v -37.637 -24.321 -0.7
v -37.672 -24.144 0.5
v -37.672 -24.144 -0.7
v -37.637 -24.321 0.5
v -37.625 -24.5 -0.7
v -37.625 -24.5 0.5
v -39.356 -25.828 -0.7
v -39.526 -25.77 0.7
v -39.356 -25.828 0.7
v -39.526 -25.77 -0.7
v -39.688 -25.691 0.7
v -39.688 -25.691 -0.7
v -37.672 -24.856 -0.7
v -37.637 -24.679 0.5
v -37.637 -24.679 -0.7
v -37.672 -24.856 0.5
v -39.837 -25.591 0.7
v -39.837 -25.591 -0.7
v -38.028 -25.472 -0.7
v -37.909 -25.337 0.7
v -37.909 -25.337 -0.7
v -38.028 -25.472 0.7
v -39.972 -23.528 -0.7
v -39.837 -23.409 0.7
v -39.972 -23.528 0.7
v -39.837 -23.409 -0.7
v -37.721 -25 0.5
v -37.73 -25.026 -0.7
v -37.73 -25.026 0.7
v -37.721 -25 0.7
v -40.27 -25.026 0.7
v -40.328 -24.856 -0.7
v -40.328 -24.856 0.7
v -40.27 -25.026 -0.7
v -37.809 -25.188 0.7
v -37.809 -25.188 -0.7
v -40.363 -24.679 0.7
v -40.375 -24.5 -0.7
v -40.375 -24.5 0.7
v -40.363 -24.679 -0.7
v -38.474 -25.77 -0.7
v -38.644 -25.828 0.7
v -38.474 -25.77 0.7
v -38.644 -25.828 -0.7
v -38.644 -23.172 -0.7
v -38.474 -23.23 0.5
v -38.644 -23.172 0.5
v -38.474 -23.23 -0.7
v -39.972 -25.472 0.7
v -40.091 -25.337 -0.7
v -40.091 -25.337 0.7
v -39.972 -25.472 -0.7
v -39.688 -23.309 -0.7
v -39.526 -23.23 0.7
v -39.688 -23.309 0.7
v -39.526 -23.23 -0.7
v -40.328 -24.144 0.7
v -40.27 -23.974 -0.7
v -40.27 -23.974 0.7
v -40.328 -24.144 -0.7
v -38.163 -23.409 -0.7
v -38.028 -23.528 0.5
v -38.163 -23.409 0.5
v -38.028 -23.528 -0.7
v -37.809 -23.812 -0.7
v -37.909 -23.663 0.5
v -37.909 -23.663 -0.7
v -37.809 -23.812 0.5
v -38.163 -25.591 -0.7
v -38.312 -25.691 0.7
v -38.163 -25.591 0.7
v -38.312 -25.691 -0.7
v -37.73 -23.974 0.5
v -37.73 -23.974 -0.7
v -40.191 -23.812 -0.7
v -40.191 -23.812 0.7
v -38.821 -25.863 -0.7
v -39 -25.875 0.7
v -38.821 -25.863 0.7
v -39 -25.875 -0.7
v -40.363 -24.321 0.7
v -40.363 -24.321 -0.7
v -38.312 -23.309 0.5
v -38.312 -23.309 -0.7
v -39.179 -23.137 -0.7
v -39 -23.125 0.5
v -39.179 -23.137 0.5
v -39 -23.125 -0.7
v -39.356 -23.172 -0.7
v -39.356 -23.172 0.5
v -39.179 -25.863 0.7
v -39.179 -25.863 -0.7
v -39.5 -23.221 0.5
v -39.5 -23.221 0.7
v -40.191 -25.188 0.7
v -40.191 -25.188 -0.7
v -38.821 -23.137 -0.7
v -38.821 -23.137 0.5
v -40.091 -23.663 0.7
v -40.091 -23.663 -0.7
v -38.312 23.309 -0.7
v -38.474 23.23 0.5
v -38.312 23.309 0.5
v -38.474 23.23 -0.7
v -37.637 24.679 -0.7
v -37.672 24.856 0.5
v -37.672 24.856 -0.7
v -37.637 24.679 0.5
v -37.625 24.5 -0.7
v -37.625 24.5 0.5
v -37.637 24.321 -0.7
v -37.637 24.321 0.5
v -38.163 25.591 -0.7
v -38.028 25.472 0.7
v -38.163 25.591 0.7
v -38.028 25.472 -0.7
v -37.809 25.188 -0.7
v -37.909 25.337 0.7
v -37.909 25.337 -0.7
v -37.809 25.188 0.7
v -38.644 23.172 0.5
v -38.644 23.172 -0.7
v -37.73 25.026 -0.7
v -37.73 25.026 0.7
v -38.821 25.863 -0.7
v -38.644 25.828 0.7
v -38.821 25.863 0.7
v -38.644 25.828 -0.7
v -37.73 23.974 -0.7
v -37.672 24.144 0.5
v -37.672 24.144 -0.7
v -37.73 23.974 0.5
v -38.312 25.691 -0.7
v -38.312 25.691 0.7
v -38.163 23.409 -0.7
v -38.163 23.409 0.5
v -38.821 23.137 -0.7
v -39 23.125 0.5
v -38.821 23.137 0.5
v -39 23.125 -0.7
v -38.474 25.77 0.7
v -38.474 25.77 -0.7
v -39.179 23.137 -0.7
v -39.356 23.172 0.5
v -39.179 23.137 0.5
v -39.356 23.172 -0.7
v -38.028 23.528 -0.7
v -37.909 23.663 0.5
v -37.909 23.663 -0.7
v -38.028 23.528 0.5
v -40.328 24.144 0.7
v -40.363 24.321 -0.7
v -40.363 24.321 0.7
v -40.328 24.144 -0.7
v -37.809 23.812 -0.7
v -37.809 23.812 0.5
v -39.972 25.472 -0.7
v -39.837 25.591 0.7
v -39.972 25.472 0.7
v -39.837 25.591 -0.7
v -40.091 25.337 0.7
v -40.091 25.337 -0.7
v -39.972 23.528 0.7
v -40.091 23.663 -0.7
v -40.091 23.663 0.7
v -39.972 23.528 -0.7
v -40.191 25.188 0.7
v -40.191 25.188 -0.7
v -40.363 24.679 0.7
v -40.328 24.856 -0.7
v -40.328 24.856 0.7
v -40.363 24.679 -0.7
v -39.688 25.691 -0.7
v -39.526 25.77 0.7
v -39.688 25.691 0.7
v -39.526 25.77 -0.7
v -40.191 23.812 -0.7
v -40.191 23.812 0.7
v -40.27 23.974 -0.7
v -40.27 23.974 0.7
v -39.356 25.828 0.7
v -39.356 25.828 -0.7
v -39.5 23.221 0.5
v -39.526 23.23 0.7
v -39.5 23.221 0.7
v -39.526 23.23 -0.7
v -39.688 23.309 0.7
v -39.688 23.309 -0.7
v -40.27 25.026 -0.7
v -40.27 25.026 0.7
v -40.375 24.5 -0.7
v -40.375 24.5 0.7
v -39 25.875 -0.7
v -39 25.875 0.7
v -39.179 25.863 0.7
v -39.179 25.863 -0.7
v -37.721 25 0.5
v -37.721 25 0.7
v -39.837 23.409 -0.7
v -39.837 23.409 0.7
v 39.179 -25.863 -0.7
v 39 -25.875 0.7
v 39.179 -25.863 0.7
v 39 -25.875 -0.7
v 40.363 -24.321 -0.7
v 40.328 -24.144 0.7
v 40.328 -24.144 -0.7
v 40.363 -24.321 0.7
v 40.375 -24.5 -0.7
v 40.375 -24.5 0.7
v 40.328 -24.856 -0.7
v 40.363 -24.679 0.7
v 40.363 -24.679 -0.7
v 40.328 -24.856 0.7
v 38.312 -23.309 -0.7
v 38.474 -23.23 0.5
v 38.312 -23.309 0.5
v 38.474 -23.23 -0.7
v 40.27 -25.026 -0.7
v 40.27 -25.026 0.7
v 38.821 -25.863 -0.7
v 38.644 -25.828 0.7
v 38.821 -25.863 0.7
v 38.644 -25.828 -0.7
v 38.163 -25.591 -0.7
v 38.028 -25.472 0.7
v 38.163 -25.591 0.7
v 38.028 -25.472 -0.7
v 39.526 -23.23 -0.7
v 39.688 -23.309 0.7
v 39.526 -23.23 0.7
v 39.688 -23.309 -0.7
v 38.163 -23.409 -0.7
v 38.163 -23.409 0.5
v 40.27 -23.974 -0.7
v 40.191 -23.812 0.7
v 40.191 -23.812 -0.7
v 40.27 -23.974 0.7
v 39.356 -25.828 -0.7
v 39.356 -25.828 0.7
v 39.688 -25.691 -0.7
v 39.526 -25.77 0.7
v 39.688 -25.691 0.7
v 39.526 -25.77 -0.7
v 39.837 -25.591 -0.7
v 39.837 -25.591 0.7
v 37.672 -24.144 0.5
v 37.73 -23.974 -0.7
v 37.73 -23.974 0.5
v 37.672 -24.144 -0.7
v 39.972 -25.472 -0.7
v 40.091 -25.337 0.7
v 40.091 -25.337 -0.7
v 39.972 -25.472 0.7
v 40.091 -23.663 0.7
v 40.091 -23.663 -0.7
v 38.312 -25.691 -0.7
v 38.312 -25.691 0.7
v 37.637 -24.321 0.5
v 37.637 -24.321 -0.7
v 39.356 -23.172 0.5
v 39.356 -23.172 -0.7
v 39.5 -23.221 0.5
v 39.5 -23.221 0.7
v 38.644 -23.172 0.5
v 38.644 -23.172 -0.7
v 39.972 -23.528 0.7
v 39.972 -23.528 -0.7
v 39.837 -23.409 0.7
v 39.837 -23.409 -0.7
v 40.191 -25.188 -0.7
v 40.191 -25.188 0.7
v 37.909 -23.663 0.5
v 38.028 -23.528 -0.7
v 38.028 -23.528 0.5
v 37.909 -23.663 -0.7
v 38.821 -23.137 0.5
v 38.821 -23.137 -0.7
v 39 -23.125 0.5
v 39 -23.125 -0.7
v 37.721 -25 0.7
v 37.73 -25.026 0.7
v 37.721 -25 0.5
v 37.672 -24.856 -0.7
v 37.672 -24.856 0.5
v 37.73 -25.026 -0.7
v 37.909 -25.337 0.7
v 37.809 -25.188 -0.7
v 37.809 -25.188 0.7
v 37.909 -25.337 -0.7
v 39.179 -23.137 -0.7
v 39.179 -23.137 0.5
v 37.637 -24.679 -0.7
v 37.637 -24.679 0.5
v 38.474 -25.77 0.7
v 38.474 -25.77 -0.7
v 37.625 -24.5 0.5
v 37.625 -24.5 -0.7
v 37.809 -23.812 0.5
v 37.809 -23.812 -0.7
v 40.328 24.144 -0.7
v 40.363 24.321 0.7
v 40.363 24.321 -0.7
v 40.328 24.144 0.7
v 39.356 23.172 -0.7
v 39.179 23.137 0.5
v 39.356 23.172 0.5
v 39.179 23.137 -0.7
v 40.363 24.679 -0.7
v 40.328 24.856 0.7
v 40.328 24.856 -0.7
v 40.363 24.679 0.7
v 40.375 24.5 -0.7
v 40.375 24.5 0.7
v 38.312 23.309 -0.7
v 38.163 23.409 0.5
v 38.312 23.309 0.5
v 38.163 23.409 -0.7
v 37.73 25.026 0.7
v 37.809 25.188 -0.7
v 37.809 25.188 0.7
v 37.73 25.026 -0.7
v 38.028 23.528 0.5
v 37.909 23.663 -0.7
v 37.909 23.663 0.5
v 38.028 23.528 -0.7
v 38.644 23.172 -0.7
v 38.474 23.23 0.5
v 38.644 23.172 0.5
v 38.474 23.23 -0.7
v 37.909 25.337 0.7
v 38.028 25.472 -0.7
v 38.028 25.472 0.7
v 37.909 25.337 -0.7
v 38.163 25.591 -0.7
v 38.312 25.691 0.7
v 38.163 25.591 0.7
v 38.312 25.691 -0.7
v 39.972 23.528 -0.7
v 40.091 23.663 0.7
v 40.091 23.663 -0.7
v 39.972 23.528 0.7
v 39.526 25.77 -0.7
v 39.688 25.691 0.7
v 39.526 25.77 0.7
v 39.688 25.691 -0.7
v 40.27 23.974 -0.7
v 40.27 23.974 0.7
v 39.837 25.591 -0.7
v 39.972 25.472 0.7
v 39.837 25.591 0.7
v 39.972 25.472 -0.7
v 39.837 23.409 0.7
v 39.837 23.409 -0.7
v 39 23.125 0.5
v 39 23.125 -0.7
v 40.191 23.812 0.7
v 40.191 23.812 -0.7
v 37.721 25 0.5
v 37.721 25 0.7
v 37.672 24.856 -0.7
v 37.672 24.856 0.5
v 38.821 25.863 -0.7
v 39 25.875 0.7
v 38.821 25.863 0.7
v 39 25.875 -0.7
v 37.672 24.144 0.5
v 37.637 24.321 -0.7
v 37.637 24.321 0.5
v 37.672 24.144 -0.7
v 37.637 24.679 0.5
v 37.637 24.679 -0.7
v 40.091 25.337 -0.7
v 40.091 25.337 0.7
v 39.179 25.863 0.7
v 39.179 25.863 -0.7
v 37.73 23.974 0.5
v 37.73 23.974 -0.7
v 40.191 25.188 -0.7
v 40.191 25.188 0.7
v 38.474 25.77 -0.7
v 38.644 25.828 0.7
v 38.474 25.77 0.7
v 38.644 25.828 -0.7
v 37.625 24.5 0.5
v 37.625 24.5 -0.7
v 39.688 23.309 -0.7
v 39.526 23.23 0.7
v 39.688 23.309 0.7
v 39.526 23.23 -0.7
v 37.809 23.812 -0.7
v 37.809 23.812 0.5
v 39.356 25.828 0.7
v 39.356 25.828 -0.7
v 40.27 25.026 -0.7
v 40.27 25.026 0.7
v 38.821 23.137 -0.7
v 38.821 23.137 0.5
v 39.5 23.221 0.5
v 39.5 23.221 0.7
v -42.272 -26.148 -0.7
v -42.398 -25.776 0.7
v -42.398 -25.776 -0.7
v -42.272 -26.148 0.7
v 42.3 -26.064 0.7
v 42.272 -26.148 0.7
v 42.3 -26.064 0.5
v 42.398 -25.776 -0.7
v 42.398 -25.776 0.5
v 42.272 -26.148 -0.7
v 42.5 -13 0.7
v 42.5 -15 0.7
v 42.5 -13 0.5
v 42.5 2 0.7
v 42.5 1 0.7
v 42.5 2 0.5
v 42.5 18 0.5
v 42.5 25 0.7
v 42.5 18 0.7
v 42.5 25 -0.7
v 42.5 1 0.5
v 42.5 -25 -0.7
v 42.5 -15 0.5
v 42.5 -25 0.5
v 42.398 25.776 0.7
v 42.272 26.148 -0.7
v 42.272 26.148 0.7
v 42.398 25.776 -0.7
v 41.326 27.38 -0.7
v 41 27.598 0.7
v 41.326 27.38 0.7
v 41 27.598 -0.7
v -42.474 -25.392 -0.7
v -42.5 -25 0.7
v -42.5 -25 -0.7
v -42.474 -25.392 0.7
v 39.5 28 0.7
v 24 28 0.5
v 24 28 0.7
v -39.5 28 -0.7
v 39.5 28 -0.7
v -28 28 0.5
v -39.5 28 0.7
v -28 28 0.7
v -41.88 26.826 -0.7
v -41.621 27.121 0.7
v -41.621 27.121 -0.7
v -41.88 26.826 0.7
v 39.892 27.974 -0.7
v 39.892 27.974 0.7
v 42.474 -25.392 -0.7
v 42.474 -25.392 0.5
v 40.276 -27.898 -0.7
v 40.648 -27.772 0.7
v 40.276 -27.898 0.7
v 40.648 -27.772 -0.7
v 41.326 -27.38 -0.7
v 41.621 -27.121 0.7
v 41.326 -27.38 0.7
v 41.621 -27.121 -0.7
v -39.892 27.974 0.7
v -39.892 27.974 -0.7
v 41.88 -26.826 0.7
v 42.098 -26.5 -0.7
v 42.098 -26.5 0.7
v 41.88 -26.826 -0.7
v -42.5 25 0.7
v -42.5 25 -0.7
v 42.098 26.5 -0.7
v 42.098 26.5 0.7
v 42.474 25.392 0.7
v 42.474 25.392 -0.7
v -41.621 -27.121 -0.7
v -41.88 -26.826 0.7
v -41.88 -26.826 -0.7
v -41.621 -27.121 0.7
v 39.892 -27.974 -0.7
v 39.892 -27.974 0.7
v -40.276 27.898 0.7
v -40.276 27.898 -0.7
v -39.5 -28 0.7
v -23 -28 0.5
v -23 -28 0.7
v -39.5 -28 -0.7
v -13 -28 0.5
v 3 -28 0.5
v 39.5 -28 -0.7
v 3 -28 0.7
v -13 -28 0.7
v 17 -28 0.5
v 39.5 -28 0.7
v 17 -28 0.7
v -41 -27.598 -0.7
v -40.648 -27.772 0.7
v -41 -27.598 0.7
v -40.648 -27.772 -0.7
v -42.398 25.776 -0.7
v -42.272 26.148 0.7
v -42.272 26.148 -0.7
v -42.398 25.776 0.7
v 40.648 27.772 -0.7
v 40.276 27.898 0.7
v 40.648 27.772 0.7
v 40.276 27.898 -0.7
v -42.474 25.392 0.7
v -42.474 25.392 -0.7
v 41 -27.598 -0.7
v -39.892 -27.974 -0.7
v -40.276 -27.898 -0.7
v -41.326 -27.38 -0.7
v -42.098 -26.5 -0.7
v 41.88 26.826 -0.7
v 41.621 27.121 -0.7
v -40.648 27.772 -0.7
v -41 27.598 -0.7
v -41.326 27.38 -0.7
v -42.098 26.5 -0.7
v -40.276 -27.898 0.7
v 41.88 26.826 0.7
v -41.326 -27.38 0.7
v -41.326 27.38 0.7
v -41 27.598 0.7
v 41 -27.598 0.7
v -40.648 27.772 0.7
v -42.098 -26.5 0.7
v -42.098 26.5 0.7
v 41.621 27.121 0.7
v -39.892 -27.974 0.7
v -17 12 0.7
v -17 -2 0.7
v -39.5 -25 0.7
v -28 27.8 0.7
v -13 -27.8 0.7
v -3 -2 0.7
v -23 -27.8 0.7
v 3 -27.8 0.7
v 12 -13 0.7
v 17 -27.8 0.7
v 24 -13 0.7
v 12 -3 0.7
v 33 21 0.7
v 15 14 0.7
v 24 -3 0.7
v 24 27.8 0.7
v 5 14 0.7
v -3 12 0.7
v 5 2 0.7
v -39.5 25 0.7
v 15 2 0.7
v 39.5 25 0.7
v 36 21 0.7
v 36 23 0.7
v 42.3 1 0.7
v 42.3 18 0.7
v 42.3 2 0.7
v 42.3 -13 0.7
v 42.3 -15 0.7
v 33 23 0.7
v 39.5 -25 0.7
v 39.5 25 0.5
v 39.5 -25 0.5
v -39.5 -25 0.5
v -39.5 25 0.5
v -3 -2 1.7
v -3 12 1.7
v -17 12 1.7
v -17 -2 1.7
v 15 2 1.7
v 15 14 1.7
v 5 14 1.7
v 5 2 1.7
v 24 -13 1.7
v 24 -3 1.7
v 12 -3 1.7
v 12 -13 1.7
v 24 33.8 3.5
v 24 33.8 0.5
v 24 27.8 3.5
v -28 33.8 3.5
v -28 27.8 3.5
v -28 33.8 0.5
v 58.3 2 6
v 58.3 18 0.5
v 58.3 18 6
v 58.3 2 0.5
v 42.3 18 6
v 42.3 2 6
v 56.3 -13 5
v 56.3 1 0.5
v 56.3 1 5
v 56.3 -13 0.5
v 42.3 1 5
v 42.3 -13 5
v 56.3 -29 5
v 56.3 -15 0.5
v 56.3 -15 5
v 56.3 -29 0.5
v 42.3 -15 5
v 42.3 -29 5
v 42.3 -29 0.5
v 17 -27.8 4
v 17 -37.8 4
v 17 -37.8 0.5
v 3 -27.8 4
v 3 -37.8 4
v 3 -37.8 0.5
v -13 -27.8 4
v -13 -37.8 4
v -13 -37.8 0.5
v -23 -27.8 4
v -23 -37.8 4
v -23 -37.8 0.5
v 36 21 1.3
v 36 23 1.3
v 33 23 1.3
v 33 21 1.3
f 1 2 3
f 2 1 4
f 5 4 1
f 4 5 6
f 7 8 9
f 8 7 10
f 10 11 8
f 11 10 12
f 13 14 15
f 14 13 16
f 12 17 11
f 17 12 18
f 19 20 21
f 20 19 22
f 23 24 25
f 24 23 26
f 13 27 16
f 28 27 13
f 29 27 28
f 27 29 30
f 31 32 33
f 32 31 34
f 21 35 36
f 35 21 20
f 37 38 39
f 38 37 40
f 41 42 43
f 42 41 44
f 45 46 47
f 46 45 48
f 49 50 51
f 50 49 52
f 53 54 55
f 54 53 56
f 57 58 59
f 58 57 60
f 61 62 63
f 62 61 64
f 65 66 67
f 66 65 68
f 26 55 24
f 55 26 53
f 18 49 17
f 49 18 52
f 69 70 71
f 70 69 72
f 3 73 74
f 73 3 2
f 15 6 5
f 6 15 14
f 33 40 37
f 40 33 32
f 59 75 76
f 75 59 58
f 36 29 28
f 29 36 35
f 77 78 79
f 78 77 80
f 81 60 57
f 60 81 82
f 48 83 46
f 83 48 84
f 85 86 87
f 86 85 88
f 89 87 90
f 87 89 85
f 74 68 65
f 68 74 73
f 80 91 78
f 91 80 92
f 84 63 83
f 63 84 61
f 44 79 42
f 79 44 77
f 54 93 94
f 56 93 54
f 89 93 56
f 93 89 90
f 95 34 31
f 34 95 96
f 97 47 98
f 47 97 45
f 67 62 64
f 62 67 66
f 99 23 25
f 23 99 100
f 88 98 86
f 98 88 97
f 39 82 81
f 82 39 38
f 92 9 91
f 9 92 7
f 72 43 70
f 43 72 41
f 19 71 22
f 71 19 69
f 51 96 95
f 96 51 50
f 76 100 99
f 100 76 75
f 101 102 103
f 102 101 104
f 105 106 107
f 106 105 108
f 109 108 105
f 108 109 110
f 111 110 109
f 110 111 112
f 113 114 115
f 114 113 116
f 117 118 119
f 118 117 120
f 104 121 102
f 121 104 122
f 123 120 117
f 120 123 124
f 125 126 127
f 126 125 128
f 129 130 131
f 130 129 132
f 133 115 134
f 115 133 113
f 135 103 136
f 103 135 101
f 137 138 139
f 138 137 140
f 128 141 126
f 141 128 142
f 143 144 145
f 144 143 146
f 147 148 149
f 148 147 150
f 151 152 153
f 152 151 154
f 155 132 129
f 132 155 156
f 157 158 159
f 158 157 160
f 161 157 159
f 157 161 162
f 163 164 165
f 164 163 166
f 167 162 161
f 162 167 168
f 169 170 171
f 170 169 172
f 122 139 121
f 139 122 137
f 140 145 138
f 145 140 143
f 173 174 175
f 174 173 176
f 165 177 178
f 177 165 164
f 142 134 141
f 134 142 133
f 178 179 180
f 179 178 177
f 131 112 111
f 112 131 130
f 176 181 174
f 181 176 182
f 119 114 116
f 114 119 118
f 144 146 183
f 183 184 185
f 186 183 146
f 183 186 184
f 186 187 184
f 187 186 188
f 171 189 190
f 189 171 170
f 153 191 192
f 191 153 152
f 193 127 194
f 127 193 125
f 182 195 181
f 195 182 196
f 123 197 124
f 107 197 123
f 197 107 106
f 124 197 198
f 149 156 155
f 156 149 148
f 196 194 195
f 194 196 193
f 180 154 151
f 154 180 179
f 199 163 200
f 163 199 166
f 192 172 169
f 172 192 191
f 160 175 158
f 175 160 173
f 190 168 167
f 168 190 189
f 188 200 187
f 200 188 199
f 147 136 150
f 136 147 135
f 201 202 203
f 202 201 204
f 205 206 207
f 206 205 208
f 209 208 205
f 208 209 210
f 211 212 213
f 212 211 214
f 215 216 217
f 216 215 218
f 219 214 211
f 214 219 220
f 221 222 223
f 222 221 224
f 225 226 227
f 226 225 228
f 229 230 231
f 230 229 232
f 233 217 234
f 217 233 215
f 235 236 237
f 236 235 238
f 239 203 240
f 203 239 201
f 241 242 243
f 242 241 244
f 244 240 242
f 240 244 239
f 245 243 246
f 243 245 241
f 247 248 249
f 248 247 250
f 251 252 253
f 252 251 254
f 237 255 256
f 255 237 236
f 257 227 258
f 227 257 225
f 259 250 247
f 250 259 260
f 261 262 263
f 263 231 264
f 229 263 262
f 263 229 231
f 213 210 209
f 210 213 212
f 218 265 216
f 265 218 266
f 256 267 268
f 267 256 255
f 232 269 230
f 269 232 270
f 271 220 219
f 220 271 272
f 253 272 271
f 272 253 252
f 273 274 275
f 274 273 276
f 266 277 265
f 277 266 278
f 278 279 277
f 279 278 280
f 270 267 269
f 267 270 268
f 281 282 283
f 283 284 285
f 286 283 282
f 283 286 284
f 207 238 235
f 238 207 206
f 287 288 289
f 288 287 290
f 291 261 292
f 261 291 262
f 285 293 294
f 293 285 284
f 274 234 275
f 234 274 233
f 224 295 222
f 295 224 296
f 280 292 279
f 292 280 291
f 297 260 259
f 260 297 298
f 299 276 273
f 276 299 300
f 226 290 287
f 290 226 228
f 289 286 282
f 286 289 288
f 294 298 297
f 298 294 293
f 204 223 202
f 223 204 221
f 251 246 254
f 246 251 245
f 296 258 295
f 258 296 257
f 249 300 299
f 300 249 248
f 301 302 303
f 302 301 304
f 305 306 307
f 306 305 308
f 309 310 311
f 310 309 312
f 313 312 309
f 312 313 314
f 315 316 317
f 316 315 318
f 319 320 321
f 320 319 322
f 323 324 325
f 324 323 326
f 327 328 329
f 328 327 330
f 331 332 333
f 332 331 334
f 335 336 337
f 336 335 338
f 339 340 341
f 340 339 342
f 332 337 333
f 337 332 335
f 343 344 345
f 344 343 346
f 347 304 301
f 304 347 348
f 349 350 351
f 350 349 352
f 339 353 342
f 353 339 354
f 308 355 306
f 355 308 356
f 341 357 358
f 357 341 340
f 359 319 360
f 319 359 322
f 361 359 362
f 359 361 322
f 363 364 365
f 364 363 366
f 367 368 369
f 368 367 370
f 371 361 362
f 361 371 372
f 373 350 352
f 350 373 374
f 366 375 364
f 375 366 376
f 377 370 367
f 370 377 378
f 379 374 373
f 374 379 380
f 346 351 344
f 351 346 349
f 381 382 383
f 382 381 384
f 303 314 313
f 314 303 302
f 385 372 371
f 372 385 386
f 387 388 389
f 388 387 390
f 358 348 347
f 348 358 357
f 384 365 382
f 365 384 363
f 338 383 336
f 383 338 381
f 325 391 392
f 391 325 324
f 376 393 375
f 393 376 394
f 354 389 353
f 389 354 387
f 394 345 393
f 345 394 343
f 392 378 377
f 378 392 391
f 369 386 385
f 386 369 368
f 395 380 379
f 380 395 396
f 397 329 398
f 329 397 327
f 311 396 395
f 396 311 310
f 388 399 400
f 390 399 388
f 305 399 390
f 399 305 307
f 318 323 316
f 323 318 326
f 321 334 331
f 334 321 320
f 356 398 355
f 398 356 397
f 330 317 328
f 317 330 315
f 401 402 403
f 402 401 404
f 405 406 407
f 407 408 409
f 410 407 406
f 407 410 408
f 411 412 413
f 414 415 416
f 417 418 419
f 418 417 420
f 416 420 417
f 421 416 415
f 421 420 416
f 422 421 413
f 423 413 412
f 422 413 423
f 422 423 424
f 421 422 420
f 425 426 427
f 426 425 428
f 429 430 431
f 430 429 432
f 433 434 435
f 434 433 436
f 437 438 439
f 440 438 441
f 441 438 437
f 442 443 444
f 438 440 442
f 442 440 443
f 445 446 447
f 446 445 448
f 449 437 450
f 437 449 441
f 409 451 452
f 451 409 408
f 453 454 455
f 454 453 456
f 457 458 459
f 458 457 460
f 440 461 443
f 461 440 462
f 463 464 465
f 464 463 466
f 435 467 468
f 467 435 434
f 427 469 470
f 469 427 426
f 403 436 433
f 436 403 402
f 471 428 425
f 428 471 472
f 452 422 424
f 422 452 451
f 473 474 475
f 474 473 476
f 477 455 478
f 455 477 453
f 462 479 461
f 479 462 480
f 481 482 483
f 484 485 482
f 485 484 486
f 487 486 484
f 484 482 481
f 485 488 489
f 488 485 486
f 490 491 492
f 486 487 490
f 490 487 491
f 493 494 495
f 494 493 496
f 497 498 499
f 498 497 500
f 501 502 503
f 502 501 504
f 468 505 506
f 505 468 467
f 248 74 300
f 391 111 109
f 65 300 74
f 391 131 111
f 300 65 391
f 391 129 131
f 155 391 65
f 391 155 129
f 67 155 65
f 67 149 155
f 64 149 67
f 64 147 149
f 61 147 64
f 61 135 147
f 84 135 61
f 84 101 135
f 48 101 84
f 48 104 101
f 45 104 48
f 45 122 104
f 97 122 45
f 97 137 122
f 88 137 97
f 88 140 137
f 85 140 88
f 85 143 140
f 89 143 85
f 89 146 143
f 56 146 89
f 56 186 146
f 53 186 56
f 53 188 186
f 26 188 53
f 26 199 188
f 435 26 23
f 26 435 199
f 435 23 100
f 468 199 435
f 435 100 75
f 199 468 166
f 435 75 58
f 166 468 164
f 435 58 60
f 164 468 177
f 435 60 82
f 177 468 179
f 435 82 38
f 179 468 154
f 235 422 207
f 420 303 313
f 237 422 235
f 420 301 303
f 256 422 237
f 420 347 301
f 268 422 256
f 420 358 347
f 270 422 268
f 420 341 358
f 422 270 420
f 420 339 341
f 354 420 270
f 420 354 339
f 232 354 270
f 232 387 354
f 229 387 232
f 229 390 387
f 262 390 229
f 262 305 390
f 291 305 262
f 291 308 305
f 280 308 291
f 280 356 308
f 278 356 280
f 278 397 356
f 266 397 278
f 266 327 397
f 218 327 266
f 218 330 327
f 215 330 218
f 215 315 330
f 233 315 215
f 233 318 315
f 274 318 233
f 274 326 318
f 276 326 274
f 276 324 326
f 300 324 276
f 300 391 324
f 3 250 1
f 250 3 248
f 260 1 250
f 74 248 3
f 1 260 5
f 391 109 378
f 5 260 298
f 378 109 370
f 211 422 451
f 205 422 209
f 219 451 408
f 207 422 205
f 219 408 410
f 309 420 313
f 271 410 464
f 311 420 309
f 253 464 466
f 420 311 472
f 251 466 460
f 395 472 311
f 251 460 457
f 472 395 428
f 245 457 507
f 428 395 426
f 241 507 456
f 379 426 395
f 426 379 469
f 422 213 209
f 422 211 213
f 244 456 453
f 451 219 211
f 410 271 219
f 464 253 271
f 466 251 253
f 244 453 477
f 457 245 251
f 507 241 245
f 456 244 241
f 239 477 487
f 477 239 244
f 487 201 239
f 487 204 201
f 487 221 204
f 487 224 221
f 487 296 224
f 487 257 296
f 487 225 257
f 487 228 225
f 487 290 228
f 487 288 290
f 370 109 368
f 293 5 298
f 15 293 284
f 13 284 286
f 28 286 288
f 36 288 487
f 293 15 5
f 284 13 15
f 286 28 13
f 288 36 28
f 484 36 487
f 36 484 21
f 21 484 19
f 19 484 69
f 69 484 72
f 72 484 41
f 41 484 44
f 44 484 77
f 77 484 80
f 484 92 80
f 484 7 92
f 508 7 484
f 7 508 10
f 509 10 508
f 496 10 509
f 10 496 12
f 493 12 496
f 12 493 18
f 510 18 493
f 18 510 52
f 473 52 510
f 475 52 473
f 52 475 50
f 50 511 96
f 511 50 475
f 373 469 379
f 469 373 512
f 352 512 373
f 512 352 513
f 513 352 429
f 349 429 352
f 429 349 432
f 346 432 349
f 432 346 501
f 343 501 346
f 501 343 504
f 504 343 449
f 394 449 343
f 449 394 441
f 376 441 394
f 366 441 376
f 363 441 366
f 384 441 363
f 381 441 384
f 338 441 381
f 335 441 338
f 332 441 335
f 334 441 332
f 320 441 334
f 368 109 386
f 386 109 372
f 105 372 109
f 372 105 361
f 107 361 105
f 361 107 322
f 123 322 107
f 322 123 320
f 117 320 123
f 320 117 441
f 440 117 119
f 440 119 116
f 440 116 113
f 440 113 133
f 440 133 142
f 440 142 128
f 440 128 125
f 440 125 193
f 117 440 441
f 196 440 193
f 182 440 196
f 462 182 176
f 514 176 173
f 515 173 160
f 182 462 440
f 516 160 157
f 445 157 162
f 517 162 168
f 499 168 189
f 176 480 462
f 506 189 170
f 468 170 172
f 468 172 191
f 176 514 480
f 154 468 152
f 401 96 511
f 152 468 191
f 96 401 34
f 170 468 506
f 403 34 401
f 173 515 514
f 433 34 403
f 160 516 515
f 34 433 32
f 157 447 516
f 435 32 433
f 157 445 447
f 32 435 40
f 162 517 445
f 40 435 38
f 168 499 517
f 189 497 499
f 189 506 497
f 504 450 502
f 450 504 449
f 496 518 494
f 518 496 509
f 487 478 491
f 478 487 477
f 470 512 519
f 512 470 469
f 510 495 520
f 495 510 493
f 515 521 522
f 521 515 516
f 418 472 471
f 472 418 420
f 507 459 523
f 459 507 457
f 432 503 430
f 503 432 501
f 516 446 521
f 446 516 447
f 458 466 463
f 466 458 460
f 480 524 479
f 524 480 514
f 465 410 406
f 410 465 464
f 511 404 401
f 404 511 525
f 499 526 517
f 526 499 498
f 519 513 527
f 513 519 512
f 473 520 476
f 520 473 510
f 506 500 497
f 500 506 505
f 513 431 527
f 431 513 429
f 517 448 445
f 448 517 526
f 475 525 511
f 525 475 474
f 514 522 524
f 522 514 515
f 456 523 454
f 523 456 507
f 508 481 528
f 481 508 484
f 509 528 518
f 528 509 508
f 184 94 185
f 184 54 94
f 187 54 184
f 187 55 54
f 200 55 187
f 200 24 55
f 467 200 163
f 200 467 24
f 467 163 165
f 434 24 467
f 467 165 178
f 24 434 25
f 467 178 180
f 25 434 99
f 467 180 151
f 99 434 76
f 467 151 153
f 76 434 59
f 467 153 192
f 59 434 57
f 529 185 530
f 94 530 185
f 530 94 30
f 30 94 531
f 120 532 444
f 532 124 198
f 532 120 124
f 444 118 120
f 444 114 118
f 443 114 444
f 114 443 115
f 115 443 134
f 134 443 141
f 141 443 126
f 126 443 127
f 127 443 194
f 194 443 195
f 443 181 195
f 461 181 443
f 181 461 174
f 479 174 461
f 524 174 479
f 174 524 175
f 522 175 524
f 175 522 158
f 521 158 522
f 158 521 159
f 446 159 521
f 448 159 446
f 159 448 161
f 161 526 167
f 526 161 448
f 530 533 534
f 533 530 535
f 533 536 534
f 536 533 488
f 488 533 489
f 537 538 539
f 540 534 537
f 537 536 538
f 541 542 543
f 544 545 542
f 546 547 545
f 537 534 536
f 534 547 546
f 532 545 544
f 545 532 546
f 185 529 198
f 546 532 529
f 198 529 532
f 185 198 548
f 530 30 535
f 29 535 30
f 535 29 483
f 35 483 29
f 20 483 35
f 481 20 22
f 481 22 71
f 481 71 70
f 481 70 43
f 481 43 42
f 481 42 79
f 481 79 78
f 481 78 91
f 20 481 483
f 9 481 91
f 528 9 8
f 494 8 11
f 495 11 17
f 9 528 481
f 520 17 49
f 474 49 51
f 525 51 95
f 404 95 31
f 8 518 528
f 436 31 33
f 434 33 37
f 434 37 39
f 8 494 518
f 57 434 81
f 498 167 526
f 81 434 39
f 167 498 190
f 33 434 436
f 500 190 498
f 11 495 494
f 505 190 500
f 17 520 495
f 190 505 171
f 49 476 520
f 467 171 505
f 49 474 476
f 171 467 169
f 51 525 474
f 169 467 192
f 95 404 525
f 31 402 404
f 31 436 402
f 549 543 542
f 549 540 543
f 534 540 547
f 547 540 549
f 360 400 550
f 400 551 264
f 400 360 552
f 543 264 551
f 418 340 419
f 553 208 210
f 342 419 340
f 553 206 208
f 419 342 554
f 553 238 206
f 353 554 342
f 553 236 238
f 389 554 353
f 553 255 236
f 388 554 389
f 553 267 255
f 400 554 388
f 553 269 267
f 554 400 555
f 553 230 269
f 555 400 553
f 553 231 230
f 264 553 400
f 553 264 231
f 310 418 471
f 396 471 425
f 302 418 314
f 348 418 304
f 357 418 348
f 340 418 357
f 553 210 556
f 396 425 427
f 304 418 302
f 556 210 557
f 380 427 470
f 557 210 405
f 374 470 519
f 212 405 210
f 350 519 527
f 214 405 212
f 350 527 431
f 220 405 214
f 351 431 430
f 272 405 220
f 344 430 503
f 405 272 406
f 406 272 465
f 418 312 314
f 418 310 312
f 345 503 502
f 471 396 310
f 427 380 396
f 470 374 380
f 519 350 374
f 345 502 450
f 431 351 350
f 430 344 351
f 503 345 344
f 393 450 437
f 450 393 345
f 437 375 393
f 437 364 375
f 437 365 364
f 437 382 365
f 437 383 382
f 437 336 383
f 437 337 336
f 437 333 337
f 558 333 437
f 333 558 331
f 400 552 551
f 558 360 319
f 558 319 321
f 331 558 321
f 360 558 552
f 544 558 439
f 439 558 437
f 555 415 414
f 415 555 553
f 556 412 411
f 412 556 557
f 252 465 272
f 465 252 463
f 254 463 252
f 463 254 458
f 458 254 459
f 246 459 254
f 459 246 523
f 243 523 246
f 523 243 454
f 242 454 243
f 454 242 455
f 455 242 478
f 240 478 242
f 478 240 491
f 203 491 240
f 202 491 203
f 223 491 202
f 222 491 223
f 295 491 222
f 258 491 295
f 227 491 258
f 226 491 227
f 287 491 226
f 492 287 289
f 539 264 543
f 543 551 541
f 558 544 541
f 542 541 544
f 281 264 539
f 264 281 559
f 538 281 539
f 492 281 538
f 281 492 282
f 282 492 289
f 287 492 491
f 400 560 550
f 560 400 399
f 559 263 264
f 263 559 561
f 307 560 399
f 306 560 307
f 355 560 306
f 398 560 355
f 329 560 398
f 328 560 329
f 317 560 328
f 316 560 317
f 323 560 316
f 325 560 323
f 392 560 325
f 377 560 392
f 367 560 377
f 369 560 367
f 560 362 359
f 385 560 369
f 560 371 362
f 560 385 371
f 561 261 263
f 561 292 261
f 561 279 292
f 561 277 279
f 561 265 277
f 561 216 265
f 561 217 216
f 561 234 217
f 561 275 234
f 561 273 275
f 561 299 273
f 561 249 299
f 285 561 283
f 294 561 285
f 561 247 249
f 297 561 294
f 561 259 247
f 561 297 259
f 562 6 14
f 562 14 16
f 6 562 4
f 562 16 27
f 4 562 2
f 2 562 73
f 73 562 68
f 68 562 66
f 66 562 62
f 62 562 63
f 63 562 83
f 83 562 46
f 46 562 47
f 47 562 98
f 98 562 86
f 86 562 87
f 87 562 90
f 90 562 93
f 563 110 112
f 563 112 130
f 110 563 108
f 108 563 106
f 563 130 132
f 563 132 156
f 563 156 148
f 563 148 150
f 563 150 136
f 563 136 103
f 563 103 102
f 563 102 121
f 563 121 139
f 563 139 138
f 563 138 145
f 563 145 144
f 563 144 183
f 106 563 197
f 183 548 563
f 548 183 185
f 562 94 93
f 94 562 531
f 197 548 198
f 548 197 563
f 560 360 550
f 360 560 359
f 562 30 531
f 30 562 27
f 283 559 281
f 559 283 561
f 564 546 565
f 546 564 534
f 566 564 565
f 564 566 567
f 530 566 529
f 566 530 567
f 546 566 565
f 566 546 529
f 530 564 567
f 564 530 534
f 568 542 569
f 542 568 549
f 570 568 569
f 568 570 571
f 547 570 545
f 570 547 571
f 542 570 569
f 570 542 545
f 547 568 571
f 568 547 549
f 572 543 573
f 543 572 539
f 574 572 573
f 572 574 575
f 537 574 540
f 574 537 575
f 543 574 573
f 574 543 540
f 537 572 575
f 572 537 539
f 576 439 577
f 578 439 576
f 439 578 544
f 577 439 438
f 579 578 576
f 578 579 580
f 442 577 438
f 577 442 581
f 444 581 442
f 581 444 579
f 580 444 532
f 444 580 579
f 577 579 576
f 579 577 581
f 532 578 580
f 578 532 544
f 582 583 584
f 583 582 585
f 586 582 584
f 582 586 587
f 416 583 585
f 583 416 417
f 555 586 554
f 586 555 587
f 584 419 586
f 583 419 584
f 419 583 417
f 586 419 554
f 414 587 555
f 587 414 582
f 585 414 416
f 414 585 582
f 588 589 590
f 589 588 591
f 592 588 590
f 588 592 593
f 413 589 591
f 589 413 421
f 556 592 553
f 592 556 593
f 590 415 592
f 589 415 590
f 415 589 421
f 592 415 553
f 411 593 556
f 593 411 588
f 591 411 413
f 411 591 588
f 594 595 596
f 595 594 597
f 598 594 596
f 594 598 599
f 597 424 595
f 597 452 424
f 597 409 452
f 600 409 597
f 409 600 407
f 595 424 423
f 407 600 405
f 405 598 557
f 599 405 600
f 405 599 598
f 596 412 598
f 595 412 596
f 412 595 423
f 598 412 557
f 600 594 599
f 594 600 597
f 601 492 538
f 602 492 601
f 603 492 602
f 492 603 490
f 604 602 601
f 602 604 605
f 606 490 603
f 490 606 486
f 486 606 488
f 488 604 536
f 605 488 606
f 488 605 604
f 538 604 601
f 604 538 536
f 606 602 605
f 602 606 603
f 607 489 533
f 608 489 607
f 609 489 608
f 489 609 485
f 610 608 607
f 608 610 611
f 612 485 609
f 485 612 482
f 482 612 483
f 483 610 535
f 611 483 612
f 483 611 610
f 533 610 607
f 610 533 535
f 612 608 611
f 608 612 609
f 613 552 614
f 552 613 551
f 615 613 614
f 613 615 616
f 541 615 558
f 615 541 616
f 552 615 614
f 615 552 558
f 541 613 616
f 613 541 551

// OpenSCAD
$fn = 48;

// Board parameters (requested)
pcb_length = 85.0;
pcb_width  = 56.0;
pcb_thickness = 1.4;

// Detail parameters (generic SBC-like features)
corner_r = 3.0;

// Mounting holes (typical SBC pattern, generic)
hole_d = 2.75;
hole_edge_x = 3.5;
hole_edge_y = 3.5;

// Component heights (kept small but visible)
soldermask_lip = 0.2;          // slight top lip to ensure union connectivity
chip_h = 1.2;
usb_h  = 4.5;
eth_h  = 5.5;
hdmi_h = 3.5;
audio_h = 3.5;
gpio_h = 3.0;

// Small overlap to guarantee connected solid
ov = 0.2;

// ---------- Helpers ----------
module rounded_rect_2d(L, W, r){
    r2 = min(r, min(L, W)/2);
    hull() {
        for (sx = [-1, 1], sy = [-1, 1])
            translate([sx*(L/2 - r2), sy*(W/2 - r2)]) circle(r=r2);
    }
}

module pcb_plate(){
    // Rounded PCB with mounting holes cut out
    difference() {
        linear_extrude(height=pcb_thickness, center=true)
            rounded_rect_2d(pcb_length, pcb_width, corner_r);

        // Mounting holes (through)
        for (sx = [-1, 1], sy = [-1, 1]) {
            translate([sx*(pcb_length/2 - hole_edge_x), sy*(pcb_width/2 - hole_edge_y), 0])
                cylinder(d=hole_d, h=pcb_thickness + 2, center=true);
        }
    }
}

module top_component(size_xyz, pos_xyz, col=[0.2,0.2,0.2]){
    // Places a component so its bottom slightly intersects the PCB top surface
    // PCB top surface z = +pcb_thickness/2
    translate([
        pos_xyz[0],
        pos_xyz[1],
        pcb_thickness/2 + size_xyz[2]/2 - ov
    ])
        color(col) cube(size_xyz, center=true);
}

module side_connector(size_xyz, side="right", y=0, z_h=4, col=[0.75,0.75,0.75]){
    // Places a connector protruding from a board edge, with overlap into PCB
    // size_xyz = [protrusion_x, width_y, height_z]
    x_in = size_xyz[0]/2 - ov;
    x_edge = pcb_length/2;
    x_pos = (side=="right")
        ? (x_edge + x_in)
        : (-x_edge - x_in);

    translate([x_pos, y, pcb_thickness/2 + size_xyz[2]/2 - ov])
        color(col) cube(size_xyz, center=true);
}

module end_connector(size_xyz, end="top", x=0, col=[0.75,0.75,0.75]){
    // Places a connector protruding from a board end (along Y), with overlap into PCB
    // size_xyz = [width_x, protrusion_y, height_z]
    y_in = size_xyz[1]/2 - ov;
    y_edge = pcb_width/2;
    y_pos = (end=="top")
        ? (y_edge + y_in)
        : (-y_edge - y_in);

    translate([x, y_pos, pcb_thickness/2 + size_xyz[2]/2 - ov])
        color(col) cube(size_xyz, center=true);
}

// ---------- Model ----------
module single_board_computer(){
    union() {
        // PCB
        color([0.0, 0.4, 0.2]) pcb_plate();

        // Slight top soldermask lip (ensures visible thickness and helps union)
        translate([0,0, pcb_thickness/2 + soldermask_lip/2 - ov])
            color([0.0, 0.35, 0.18])
            cube([pcb_length-2*corner_r, pcb_width-2*corner_r, soldermask_lip], center=true);

        // Major chips (generic)
        top_component([14, 14, chip_h], [ -10,  5, 0], [0.15,0.15,0.15]); // SoC
        top_component([10, 12, chip_h], [  10,  8, 0], [0.18,0.18,0.18]); // RAM
        top_component([12, 10, chip_h], [  18, -8, 0], [0.12,0.12,0.12]); // PMIC

        // GPIO header block (top edge)
        end_connector([52, 6, gpio_h], end="top", x=-2, col=[0.05,0.05,0.05]);

        // Right-side connectors (USB + Ethernet style)
        // Ethernet (larger)
        side_connector([16, 16, eth_h], side="right", y= 10, col=[0.7,0.7,0.7]);
        // USB stack (two blocks)
        side_connector([14, 14, usb_h], side="right", y= -6, col=[0.72,0.72,0.72]);
        side_connector([14, 14, usb_h], side="right", y= -22, col=[0.72,0.72,0.72]);

        // Bottom edge connectors (HDMI + audio)
        end_connector([14, 10, hdmi_h], end="bottom", x= 10, col=[0.65,0.65,0.65]); // HDMI
        end_connector([10, 10, audio_h], end="bottom", x=-18, col=[0.1,0.1,0.1]);    // Audio jack block

        // Small status LED bump (still connected)
        top_component([3, 2, 0.8], [pcb_length/2 - 8, pcb_width/2 - 6, 0], [0.8,0.1,0.1]);
    }
}

single_board_computer();
